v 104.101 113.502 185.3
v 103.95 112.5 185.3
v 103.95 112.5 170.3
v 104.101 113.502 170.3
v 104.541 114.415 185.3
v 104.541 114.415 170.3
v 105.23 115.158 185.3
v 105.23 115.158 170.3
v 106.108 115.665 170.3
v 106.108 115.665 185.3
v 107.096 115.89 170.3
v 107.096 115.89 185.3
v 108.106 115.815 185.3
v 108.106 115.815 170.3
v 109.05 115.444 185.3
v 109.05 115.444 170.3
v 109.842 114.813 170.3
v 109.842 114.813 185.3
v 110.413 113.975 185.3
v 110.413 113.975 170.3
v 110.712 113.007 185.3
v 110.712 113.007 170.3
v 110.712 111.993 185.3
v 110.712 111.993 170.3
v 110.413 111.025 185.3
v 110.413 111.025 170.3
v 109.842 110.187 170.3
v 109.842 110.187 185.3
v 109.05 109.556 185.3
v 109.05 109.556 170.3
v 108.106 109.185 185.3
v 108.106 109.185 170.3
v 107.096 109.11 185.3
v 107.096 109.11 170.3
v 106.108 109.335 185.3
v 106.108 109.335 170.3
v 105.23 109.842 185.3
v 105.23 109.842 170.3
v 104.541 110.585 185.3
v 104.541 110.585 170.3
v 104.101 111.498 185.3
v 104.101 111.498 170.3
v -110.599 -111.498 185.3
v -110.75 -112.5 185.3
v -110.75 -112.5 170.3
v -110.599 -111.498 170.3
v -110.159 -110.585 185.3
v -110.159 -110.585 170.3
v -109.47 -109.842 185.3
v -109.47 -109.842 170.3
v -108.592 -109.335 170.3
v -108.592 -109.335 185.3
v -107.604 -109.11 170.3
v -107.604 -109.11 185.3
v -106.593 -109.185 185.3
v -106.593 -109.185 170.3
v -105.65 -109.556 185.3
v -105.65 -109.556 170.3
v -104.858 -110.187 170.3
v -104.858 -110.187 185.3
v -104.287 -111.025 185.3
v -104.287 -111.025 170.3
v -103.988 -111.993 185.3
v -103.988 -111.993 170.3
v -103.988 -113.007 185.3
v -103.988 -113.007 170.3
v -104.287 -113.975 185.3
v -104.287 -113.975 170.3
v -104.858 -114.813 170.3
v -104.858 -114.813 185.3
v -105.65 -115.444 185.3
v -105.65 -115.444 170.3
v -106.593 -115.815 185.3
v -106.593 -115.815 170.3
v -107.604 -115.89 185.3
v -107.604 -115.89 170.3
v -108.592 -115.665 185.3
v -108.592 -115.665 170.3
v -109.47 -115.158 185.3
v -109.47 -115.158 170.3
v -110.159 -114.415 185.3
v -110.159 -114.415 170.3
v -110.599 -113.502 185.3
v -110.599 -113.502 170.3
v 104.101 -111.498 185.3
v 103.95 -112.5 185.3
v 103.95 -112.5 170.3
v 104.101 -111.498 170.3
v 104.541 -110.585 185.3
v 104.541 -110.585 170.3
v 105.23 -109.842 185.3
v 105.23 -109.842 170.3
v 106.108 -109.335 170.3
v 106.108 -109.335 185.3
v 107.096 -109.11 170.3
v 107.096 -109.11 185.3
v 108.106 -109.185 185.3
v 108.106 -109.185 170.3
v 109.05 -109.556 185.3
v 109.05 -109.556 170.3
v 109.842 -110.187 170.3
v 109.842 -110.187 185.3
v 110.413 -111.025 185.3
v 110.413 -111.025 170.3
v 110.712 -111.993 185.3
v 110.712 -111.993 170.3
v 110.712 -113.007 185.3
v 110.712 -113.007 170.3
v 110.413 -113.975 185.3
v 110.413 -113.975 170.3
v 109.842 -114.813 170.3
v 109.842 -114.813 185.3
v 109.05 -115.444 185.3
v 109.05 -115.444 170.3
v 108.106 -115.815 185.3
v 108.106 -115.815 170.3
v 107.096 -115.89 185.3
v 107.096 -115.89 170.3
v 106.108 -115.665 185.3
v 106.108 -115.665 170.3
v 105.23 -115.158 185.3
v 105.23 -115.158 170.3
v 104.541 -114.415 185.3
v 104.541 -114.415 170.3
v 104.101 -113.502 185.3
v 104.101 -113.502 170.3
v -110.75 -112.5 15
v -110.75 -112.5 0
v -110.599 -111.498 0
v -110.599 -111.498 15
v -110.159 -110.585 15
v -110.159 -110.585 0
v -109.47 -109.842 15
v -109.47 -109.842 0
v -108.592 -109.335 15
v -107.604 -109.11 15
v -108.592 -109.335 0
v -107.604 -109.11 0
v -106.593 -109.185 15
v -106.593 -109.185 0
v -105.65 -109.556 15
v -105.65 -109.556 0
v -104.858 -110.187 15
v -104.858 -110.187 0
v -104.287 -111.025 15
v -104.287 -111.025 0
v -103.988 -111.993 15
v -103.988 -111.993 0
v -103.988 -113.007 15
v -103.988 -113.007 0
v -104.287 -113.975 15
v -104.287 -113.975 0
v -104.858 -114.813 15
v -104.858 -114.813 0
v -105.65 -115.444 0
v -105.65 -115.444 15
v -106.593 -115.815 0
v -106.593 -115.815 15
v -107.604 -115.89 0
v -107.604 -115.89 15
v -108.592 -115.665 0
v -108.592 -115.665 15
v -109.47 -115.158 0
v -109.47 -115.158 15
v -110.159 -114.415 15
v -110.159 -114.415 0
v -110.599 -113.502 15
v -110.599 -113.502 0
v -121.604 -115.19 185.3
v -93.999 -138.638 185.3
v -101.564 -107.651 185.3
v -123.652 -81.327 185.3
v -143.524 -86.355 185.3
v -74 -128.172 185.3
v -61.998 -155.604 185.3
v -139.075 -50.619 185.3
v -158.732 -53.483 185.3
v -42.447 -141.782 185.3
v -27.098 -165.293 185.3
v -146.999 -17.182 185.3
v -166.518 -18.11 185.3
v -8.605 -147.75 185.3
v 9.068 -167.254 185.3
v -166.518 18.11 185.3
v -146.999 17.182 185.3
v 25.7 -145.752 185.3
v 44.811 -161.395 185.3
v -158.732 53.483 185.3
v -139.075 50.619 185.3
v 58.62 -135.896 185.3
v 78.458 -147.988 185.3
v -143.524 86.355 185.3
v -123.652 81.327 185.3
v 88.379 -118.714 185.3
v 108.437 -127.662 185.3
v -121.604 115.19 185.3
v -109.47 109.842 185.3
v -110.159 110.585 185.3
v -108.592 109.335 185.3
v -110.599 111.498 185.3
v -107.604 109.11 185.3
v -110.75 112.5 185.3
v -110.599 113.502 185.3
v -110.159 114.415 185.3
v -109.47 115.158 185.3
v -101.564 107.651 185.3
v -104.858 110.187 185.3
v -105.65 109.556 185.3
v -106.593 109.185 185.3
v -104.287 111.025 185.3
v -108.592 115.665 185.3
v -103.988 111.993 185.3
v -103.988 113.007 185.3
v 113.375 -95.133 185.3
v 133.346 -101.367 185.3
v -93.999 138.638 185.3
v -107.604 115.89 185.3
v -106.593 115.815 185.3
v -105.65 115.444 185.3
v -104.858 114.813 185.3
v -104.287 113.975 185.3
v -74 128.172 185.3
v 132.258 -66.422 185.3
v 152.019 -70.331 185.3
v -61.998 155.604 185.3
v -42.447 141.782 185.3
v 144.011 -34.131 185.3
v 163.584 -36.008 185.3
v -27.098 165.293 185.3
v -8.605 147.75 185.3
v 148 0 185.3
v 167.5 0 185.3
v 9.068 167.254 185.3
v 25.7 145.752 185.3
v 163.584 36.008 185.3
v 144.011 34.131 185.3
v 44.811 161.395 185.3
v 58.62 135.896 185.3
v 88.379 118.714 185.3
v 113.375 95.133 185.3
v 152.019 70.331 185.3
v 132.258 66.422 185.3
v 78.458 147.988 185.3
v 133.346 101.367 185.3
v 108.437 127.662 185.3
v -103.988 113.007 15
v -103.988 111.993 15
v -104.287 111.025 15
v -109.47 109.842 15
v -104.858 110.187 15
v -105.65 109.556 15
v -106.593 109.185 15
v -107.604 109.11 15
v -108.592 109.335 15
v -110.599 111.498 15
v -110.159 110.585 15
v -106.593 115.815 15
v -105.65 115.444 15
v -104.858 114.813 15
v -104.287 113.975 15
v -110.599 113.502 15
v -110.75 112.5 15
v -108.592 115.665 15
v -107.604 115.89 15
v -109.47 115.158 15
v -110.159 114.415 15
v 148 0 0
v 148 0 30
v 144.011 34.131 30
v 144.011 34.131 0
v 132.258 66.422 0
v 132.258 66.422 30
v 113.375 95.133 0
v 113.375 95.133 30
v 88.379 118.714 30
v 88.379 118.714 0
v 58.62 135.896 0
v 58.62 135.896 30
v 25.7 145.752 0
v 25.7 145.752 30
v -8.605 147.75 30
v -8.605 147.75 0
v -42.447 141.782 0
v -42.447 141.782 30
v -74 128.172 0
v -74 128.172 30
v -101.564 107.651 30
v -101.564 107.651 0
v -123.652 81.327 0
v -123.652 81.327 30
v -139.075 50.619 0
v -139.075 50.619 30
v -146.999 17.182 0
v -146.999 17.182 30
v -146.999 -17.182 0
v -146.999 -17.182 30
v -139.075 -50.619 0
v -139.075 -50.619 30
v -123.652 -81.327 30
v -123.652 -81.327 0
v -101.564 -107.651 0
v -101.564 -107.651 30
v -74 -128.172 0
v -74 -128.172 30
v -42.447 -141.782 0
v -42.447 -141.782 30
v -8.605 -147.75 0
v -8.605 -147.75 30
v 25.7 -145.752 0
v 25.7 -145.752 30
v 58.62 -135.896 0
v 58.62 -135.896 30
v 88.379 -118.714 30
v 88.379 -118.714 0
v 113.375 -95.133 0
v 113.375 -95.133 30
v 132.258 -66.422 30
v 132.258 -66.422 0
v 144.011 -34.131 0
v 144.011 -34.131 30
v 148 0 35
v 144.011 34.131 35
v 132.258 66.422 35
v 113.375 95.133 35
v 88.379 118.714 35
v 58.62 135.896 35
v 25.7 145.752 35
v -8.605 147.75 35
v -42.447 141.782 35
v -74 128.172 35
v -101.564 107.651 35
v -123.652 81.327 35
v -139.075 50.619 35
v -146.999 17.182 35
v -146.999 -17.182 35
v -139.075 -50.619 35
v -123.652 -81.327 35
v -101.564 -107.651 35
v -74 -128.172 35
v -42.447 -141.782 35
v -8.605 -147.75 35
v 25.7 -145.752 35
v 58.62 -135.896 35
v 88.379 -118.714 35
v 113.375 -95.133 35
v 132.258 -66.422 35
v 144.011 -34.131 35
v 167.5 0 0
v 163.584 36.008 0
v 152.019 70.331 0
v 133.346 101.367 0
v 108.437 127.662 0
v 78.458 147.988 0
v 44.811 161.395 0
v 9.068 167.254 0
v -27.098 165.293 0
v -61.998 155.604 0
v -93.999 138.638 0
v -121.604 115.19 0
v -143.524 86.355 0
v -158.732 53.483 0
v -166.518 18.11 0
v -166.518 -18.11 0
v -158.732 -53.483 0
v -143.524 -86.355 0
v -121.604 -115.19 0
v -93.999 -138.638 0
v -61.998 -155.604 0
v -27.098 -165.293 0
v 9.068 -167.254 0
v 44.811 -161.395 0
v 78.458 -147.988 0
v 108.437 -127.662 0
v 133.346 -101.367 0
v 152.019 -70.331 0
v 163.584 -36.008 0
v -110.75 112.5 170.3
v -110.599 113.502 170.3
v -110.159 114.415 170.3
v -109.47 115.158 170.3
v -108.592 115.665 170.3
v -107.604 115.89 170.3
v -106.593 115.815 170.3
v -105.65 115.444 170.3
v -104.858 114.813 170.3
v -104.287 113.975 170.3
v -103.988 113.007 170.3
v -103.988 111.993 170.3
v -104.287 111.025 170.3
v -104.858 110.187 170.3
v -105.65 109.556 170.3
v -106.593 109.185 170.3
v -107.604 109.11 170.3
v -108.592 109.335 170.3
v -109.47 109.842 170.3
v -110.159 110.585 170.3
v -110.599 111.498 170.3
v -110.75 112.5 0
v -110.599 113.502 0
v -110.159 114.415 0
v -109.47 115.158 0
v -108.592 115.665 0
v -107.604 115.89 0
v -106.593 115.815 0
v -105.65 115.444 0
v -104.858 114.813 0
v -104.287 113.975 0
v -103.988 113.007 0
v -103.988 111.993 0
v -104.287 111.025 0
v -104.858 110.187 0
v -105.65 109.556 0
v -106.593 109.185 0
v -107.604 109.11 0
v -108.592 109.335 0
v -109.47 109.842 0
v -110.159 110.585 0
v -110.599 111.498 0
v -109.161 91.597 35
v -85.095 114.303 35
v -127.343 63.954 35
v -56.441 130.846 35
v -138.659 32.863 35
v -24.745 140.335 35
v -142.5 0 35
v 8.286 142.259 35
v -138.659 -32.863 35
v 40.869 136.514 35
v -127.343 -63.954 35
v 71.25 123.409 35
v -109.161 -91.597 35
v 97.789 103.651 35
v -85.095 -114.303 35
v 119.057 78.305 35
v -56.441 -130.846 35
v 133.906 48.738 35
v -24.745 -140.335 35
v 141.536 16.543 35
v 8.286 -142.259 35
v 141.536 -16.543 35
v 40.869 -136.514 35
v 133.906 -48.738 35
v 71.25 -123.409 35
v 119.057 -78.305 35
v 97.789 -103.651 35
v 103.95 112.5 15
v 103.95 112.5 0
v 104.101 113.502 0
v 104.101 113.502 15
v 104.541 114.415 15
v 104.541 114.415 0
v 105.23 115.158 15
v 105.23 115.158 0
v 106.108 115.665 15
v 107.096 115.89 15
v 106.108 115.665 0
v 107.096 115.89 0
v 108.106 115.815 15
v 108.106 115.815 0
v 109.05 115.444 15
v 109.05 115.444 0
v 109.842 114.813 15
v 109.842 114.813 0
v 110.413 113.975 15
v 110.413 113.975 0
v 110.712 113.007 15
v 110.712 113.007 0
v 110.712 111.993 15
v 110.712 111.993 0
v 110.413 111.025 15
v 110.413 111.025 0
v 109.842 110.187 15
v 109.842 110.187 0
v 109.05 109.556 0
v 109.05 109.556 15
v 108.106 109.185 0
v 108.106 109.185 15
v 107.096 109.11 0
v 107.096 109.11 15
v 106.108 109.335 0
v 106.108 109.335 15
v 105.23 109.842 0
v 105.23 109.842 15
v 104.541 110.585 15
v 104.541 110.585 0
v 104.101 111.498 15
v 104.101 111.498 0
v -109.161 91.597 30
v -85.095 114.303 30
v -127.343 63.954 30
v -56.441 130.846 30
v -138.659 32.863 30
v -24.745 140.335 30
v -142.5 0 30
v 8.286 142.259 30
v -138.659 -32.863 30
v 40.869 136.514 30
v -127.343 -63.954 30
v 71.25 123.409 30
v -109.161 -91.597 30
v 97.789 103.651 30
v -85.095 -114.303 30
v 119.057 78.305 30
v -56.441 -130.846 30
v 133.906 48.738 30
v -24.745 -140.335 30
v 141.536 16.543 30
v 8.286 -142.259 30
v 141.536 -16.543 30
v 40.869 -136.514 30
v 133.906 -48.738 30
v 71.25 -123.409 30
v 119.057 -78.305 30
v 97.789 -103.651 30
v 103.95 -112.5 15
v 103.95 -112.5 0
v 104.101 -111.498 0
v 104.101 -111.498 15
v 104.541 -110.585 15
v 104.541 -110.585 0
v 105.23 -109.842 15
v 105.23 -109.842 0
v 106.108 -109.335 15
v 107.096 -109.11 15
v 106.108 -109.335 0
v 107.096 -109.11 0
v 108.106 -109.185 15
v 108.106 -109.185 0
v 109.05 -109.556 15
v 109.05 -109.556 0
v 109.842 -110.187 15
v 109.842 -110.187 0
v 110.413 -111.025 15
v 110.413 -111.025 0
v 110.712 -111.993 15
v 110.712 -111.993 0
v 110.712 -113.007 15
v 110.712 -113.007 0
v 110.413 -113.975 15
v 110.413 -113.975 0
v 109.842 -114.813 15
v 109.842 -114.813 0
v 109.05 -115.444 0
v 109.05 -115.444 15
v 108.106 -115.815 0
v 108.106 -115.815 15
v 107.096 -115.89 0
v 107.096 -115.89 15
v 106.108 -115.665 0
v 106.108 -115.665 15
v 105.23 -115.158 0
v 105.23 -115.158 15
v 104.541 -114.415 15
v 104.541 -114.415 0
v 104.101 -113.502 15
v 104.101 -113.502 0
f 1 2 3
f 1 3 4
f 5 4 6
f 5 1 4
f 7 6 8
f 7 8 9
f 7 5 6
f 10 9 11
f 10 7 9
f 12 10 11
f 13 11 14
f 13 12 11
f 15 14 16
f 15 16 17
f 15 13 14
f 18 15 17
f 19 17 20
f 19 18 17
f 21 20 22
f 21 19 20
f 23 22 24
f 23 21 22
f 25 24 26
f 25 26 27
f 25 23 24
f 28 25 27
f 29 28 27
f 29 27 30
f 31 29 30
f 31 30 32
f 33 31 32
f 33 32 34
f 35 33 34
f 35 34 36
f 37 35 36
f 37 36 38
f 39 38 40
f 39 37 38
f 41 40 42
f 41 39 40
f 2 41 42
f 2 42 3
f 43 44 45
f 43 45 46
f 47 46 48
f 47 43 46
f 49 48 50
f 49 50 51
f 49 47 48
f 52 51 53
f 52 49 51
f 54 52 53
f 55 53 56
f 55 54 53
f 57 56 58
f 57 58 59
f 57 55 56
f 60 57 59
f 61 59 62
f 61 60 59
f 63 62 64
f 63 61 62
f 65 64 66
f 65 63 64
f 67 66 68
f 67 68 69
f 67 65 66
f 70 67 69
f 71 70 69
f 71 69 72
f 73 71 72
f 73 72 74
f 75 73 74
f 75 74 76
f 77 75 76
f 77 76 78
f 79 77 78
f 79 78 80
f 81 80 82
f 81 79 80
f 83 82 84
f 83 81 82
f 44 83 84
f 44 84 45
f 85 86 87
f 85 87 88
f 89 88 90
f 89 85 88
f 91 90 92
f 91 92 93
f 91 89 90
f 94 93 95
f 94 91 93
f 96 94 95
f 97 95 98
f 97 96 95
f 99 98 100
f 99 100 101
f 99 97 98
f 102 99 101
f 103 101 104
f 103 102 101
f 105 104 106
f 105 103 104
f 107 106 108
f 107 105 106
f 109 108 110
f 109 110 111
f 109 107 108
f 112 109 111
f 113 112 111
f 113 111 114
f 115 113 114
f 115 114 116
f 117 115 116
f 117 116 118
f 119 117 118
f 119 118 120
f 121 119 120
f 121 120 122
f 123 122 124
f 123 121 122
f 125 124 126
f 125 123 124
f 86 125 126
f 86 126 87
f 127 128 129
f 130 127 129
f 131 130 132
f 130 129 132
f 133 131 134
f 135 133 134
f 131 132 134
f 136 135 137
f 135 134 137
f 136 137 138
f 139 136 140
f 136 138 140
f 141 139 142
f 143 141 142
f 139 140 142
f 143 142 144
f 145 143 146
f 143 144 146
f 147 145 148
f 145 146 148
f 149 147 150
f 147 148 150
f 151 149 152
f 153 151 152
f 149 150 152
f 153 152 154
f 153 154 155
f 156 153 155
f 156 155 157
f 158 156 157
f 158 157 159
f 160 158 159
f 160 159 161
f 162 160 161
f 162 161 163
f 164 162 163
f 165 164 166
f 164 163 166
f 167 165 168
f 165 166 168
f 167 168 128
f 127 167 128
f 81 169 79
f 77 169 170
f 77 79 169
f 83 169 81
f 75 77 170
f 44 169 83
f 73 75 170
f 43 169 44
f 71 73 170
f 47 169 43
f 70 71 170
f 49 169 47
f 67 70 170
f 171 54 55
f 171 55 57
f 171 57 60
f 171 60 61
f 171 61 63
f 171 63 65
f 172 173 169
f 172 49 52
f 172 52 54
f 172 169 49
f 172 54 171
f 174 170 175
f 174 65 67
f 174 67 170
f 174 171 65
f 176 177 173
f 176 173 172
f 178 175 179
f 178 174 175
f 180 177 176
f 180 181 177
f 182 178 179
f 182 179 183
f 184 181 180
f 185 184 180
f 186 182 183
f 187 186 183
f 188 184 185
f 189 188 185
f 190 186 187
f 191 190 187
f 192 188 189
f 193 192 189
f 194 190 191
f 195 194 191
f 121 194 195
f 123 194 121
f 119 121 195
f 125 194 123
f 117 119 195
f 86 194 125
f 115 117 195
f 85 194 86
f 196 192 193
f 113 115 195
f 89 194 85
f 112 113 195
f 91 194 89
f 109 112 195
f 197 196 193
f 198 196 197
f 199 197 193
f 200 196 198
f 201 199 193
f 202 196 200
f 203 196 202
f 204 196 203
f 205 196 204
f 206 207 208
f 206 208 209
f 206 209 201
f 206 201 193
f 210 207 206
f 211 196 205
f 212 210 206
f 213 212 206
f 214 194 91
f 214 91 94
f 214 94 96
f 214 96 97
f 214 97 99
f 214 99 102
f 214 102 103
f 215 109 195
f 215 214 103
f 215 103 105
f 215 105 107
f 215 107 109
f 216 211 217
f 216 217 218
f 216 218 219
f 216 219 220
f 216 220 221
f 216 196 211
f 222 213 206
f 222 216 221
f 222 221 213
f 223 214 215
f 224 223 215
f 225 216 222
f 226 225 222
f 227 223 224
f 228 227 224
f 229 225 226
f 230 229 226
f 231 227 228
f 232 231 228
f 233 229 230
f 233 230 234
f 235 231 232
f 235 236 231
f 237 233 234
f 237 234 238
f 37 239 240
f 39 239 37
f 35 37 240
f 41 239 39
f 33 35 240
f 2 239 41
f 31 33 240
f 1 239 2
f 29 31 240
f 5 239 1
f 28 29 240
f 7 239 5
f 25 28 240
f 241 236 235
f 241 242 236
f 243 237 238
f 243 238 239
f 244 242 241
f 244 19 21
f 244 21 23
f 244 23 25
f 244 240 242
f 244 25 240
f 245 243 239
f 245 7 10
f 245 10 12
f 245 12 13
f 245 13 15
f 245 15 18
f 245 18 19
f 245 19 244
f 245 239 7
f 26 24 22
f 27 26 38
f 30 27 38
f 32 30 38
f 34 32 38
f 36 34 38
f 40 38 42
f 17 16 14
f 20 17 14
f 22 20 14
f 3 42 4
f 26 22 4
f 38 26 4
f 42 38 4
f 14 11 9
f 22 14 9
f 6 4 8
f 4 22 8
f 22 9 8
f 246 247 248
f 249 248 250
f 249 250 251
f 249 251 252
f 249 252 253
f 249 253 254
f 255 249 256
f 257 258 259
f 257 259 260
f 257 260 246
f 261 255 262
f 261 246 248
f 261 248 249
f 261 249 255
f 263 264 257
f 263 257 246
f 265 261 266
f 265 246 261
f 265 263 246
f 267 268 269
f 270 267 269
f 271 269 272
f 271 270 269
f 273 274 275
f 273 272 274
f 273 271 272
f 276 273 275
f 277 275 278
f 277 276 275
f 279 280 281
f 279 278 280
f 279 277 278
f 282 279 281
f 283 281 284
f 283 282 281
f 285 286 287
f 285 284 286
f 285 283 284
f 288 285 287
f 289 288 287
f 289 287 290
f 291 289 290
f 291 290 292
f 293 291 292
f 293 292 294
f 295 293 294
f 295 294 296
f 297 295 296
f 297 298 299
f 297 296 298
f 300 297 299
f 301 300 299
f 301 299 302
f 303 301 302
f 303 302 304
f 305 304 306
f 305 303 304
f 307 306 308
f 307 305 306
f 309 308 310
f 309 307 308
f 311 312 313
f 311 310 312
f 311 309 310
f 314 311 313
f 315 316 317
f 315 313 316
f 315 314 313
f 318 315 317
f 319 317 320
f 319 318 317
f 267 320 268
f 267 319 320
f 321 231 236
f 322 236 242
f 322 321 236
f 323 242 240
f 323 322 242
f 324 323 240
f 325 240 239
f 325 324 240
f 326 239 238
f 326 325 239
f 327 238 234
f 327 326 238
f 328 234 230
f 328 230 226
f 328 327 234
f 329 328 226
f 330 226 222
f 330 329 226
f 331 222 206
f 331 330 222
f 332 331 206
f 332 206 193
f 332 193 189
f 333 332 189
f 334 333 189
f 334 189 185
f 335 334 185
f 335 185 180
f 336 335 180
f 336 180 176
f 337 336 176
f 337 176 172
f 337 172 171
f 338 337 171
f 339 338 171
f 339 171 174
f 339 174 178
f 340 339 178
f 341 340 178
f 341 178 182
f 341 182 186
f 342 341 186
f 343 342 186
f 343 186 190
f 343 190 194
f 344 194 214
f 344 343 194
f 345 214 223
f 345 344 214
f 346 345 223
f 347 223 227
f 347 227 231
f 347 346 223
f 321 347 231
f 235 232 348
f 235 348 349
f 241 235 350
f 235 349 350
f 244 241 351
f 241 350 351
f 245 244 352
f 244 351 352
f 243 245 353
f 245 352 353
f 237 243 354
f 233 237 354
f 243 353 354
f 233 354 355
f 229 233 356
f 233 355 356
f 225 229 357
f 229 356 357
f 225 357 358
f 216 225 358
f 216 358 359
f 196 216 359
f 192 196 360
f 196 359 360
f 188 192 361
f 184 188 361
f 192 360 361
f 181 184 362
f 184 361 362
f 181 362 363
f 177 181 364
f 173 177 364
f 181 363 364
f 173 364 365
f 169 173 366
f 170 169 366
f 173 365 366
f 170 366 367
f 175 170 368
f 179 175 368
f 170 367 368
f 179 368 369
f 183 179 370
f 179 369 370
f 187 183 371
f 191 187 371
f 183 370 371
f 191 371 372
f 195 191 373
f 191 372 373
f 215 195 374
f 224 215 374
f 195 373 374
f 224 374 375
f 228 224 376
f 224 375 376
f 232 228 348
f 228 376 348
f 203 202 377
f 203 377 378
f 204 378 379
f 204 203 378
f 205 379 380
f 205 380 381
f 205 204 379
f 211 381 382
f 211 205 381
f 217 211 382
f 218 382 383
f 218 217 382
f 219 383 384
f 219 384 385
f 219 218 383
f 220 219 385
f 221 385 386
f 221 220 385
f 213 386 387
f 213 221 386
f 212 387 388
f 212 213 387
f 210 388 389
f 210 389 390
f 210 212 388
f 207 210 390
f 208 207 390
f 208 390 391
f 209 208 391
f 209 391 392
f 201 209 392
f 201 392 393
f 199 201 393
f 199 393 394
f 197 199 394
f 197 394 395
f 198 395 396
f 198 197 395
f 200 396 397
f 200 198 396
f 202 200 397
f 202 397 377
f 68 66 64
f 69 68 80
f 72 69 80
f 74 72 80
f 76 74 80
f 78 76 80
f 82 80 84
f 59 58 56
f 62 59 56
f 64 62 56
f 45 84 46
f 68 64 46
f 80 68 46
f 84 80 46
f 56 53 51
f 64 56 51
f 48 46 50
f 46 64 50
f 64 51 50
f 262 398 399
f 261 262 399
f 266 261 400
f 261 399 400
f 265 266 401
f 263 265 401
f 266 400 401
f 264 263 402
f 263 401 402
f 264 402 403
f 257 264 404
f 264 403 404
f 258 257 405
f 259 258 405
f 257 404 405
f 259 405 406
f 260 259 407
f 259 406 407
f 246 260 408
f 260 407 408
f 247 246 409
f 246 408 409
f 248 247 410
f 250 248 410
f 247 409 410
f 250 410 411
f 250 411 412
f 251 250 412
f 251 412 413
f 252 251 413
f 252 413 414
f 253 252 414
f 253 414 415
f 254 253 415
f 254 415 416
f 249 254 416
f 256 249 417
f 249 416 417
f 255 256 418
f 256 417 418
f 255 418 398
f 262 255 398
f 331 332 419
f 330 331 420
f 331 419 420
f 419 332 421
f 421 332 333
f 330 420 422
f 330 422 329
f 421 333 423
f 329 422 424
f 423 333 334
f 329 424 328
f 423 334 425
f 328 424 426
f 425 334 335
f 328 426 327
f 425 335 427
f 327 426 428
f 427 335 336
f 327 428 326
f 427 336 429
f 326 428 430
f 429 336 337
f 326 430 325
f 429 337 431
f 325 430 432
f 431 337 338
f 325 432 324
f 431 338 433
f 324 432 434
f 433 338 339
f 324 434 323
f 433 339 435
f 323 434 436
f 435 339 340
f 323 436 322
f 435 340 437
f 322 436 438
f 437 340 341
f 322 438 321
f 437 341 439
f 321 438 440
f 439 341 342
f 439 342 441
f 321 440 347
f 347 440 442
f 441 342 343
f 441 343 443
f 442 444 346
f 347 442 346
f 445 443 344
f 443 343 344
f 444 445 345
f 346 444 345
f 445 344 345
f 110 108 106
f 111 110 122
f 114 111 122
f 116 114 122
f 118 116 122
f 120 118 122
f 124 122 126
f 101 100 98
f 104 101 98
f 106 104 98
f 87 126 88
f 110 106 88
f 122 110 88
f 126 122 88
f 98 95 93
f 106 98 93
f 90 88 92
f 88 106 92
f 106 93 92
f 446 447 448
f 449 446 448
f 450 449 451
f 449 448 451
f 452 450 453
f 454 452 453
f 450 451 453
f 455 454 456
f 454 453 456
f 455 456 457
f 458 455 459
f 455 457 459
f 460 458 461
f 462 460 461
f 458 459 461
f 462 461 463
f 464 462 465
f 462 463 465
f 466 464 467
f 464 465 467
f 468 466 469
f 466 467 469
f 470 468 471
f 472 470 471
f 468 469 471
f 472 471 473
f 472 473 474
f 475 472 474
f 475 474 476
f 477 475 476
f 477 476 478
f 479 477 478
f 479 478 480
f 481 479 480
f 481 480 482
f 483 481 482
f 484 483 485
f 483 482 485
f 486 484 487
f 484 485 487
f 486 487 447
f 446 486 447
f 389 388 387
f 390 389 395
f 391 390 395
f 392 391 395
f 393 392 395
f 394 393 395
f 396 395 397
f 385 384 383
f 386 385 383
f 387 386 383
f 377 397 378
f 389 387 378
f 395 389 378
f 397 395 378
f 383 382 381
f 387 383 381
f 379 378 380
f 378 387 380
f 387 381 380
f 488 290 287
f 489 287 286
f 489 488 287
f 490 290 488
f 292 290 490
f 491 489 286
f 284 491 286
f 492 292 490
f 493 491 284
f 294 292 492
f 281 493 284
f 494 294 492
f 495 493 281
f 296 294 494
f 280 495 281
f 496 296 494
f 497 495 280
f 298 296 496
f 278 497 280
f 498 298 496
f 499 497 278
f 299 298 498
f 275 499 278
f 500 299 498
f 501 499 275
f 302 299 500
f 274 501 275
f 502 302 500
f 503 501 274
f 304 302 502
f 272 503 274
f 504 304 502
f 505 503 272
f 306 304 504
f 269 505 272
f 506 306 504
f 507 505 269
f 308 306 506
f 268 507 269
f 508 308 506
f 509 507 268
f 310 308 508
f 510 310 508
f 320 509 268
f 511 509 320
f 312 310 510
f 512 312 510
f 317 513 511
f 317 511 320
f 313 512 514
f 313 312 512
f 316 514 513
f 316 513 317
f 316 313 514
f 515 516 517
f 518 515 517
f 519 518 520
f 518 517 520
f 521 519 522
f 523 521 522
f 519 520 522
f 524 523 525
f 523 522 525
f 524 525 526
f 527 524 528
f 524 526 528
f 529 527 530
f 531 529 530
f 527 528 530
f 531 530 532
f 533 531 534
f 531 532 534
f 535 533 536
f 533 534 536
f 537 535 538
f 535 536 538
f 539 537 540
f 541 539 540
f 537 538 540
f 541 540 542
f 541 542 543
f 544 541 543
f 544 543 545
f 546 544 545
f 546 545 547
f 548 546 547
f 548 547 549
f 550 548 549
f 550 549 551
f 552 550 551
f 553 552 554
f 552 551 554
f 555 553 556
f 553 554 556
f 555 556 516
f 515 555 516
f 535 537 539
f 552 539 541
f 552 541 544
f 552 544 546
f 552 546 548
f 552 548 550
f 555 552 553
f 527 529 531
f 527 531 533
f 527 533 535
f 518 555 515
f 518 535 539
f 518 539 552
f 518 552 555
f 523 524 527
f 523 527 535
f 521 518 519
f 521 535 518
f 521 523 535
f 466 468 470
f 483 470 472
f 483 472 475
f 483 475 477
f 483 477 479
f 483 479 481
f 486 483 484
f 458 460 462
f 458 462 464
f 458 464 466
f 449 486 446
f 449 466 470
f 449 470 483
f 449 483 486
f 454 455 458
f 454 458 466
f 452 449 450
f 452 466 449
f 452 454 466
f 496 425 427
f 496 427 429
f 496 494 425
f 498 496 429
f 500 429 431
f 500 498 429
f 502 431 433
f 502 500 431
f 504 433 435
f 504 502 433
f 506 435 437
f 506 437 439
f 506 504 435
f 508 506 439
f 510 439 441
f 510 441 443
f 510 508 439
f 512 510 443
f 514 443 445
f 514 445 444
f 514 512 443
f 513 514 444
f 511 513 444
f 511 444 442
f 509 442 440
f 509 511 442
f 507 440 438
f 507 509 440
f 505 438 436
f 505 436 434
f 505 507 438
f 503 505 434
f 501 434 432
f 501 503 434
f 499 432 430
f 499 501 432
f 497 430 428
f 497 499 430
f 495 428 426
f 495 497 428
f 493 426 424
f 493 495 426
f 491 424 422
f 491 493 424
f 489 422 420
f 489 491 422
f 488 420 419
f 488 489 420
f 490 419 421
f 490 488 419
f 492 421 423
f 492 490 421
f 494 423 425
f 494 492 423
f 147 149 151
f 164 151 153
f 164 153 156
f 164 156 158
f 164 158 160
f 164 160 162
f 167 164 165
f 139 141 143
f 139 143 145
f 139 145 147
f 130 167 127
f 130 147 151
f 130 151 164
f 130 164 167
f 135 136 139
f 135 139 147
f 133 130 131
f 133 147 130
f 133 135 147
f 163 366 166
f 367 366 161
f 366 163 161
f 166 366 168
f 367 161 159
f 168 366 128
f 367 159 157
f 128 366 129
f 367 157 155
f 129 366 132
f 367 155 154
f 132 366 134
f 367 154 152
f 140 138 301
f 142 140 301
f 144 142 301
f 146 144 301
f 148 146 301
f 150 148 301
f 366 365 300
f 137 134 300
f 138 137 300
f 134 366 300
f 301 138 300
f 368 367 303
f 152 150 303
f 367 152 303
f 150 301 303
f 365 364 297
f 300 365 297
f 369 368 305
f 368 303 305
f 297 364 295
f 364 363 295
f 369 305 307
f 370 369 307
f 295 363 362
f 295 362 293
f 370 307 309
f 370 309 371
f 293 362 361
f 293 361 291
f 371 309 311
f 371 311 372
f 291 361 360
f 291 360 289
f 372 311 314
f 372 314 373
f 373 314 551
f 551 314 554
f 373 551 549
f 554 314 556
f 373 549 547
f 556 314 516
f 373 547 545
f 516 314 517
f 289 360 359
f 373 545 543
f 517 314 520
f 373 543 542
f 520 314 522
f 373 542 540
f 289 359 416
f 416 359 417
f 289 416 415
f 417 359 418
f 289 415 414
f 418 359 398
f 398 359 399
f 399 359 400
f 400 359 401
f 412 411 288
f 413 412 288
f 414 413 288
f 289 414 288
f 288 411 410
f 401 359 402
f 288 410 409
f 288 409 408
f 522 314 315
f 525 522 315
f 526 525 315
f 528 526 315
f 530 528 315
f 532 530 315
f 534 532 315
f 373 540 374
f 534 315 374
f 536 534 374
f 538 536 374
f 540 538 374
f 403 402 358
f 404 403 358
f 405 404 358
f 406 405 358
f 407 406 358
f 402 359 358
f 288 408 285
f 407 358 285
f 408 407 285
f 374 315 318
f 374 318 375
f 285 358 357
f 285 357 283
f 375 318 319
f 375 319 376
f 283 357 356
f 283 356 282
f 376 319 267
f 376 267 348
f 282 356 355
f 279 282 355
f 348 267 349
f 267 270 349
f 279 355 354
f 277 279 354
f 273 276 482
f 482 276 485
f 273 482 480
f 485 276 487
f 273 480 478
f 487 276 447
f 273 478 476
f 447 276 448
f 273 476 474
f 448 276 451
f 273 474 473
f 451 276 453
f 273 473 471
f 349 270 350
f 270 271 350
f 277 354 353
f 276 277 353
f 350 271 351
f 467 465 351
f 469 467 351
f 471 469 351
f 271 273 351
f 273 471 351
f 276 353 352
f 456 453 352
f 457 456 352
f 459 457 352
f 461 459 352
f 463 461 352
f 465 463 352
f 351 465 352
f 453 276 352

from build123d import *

# Parameters (mm, degrees)
IZIM1_R                     = 167.5
IZIM1_R_2                   = 148
Y_KSEKLIK_EKSTR_ZYON2_DEPTH = 185.3
IZIM9_R                     = 3.4
KES_EKSTR_ZYON1_DEPTH       = 15
IZIM10_W                    = 5
IZIM10_H                    = 16.407796145


with BuildPart() as part:
    # Çizim1 → Yükseklik-Ekstrüzyon2 (new body)
    with BuildSketch(Plane.XY):
        Circle(IZIM1_R)
        Circle(IZIM1_R_2, mode=Mode.SUBTRACT)
    extrude(amount=Y_KSEKLIK_EKSTR_ZYON2_DEPTH)

    # Çizim9 → Kes-Ekstrüzyon1 (cut)
    with BuildSketch(Plane(origin=(0, 0, 0), x_dir=(-1, 0, 0), z_dir=(0, 0, -1))):
        with Locations((107.349895203, -112.5)):
            Circle(IZIM9_R)
        with Locations((-107.349895203, -112.5)):
            Circle(IZIM9_R)
        with Locations((-107.349895203, 112.5)):
            Circle(IZIM9_R)
        with Locations((107.349895203, 112.5)):
            Circle(IZIM9_R)
    kes_ekstr_zyon1 = extrude(amount=-KES_EKSTR_ZYON1_DEPTH, mode=Mode.SUBTRACT)

    # Çizim10 → Döndür1 (revolve)
    with BuildSketch(Plane(origin=(0, 0, 0), x_dir=(0, 0, -1), z_dir=(1, 0, 0)), mode=Mode.PRIVATE) as d_nd_r1_sk:
        with Locations((-32.5, 150.703898073)):
            Rectangle(IZIM10_W, IZIM10_H)
    revolve(d_nd_r1_sk.sketch.rotate(Axis((0, 0, 0), (0, 0, 1)), 90), axis=Axis((0, 0, 0), (0, 0, 1)))

    # Aynalama1: Kes-Ekstrüzyon1 across plane
    add(kes_ekstr_zyon1.mirror(Plane(origin=(0, 0, 92.65), x_dir=(1, 0, 0), z_dir=(0, 0, -1))), mode=Mode.SUBTRACT)


solid = part.part
